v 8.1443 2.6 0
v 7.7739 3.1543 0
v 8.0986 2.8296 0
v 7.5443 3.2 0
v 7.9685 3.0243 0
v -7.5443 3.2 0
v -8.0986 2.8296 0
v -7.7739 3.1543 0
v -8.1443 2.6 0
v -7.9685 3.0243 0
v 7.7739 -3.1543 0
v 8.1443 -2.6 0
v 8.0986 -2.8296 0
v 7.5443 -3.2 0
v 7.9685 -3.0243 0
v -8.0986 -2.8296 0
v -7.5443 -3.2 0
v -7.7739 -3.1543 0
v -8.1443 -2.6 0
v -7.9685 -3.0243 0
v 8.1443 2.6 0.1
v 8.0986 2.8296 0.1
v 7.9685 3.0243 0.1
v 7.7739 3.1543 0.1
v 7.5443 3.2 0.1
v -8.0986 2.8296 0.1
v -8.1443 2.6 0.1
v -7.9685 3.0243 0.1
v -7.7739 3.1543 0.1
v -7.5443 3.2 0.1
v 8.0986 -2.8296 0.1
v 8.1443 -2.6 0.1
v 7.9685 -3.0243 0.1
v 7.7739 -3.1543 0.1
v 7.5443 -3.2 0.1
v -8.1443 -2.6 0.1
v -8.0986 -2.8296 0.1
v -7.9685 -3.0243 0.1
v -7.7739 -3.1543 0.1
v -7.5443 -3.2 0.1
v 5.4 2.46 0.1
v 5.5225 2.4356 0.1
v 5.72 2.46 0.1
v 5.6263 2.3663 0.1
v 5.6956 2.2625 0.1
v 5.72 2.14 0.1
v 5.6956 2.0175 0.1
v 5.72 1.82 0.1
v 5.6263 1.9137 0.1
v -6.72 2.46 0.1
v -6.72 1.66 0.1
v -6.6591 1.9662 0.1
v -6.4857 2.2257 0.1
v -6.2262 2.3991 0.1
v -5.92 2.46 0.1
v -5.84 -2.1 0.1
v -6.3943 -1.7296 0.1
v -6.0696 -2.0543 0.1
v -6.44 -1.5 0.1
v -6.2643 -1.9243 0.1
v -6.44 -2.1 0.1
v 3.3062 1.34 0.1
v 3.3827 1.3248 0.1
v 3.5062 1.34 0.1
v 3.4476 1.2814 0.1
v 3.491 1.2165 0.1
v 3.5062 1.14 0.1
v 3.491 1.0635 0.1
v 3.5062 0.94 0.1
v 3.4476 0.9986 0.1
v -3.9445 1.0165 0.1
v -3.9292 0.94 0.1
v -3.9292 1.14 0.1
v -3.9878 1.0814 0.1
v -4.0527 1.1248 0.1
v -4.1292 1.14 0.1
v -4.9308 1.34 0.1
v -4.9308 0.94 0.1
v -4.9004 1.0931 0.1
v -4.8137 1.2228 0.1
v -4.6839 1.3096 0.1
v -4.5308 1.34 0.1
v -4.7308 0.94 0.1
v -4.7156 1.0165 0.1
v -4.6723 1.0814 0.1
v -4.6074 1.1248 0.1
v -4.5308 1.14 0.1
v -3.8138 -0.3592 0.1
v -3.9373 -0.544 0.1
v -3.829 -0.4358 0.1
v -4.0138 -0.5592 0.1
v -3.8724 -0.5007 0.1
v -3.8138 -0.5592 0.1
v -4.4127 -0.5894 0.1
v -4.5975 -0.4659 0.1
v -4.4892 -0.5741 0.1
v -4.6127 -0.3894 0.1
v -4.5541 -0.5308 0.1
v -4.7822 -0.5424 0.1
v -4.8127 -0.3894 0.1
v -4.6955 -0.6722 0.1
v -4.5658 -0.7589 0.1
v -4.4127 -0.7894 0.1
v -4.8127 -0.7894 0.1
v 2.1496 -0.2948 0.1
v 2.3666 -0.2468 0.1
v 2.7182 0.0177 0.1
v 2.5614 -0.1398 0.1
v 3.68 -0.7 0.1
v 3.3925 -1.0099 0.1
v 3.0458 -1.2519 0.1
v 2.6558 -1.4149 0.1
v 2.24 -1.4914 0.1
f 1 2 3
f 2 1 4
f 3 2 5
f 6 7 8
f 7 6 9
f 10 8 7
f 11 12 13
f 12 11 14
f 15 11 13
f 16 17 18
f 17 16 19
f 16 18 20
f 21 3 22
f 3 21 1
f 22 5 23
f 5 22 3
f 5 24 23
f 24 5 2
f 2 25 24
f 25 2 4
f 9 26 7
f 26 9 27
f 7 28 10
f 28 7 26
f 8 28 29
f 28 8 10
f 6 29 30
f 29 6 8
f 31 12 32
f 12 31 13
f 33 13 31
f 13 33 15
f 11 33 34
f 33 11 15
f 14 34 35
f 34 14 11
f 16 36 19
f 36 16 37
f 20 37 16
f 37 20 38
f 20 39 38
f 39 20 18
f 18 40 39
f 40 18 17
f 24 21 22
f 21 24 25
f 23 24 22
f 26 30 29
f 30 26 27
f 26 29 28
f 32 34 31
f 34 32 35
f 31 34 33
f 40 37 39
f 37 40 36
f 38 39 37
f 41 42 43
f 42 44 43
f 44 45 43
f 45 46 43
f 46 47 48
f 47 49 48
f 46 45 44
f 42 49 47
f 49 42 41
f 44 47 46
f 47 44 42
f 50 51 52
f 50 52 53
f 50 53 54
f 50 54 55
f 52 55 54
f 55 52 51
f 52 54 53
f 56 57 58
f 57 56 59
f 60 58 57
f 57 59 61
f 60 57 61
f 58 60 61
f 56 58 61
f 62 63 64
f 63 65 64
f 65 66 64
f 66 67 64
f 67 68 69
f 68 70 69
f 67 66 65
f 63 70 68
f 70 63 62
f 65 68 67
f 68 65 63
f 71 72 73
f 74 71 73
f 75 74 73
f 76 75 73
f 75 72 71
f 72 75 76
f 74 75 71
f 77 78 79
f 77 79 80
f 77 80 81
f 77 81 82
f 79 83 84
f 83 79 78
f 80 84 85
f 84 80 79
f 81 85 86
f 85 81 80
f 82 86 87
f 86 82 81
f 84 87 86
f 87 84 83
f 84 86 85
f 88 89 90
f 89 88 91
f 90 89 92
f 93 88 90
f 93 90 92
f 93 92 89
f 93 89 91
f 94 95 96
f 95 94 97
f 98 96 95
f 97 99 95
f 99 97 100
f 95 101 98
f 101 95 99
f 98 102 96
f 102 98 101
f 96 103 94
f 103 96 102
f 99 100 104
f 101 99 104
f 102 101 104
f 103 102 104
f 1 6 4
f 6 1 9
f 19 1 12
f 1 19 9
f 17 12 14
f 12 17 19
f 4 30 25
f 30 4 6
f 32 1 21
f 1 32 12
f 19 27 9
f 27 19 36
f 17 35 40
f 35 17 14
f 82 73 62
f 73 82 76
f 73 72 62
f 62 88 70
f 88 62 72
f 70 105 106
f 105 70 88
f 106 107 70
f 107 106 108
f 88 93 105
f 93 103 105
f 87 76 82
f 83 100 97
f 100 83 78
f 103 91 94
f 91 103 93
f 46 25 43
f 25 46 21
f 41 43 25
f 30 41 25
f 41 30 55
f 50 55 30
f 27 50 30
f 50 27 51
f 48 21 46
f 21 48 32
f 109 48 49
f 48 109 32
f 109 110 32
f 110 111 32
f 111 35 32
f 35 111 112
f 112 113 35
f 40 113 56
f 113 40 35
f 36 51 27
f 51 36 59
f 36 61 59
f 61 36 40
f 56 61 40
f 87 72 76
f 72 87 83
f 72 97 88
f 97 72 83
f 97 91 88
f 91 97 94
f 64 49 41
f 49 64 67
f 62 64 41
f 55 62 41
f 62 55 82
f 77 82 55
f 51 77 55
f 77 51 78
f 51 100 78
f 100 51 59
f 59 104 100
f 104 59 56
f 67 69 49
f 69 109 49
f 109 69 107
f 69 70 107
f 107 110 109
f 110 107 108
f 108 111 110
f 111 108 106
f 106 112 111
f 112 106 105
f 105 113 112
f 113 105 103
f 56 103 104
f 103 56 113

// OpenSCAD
// file: ../p/3-8ndis.scad
use <../lib.scad>
function ldraw_lib__3_8ndis() = [
// 0 Disc Negative 0.375
// 0 Name: 3-8ndis.dat
// 0 Author: Alex Taylor [anathema]
// 0 !LDRAW_ORG Primitive UPDATE 2009-02
// 0 !LICENSE Licensed under CC BY 2.0 and CC BY 4.0 : see CAreadme.txt
// 
// 0 BFC CERTIFY CCW
  [0,"BFC","CERTIFY"],
  [0,"BFC","CCW"],
// 
// 0 !HISTORY 2009-09-03 [PTadmin] Official Update 2009-02
// 
// 
// 3 16 1 0 1 0.9239 0 0.3827 1 0 0
  [3,16,1,0,1,0.9239,0,0.3827,1,0,0],
// 3 16 1 0 1 0.7071 0 0.7071 0.9239 0 0.3827
  [3,16,1,0,1,0.7071,0,0.7071,0.9239,0,0.3827],
// 3 16 1 0 1 0.3827 0 0.9239 0.7071 0 0.7071
  [3,16,1,0,1,0.3827,0,0.9239,0.7071,0,0.7071],
// 3 16 1 0 1 0 0 1 0.3827 0 0.9239
  [3,16,1,0,1,0,0,1,0.3827,0,0.9239],
// 3 16 -1 0 1 -0.3827 0 0.9239 0 0 1
  [3,16,-1,0,1,-0.3827,0,0.9239,0,0,1],
// 3 16 -1 0 1 -0.7071 0 0.7071 -0.3827 0 0.9239
  [3,16,-1,0,1,-0.7071,0,0.7071,-0.3827,0,0.9239],
// 0
];
makepoly(ldraw_lib__3_8ndis(), line=0.2);
// file: ../p/3-8chrd.scad
use <../lib.scad>
function ldraw_lib__3_8chrd() = [
// 0 Chord 0.375
// 0 Name: 3-8chrd.dat
// 0 Author: Donald Sutter [technog]
// 0 !LDRAW_ORG Primitive UPDATE 2005-01
// 0 !LICENSE Licensed under CC BY 2.0 and CC BY 4.0 : see CAreadme.txt
// 
// 0 BFC CERTIFY CCW
  [0,"BFC","CERTIFY"],
  [0,"BFC","CCW"],
// 
// 0 !HISTORY 2004-01-07 [Steffen] added primitive code for POVray
// 0 !HISTORY 2004-03-18 [mkennedy] removed pov code and rearanged polygons.
// 0 !HISTORY 2004-09-12 [cwdee] reversed winding and standardised precision
// 0 !HISTORY 2005-12-28 [PTadmin] Official Update 2005-01
// 0 !HISTORY 2007-06-24 [PTadmin] Header formatted for Contributor Agreement
// 0 !HISTORY 2008-07-01 [PTadmin] Official Update 2008-01
// 
// 
// 3 16 0.7071 0 0.7071 0.3827 0 0.9239 0 0 1
  [3,16,0.7071,0,0.7071,0.3827,0,0.9239,0,0,1],
// 4 16 0.9239 0 0.3827 -0.3827 0 0.9239 -0.7071 0 0.7071 1 0 0
  [4,16,0.9239,0,0.3827,-0.3827,0,0.9239,-0.7071,0,0.7071,1,0,0],
// 4 16 0.7071 0 0.7071 0 0 1 -0.3827 0 0.9239 0.9239 0 0.3827
  [4,16,0.7071,0,0.7071,0,0,1,-0.3827,0,0.9239,0.9239,0,0.3827],
// 0
];
makepoly(ldraw_lib__3_8chrd(), line=0.2);
// file: ../p/1-4ring1.scad
use <../lib.scad>
function ldraw_lib__1_4ring1() = [
// 0 Ring  1 x 0.25
// 0 Name: 1-4ring1.dat
// 0 Author: Chris Dee [cwdee]
// 0 !LDRAW_ORG Primitive UPDATE 2012-01
// 0 !LICENSE Licensed under CC BY 2.0 and CC BY 4.0 : see CAreadme.txt
// 
// 0 BFC CERTIFY CCW
  [0,"BFC","CERTIFY"],
  [0,"BFC","CCW"],
// 
// 0 !HISTORY 2000-05-07 [PTadmin] Official Update 2000-01
// 0 !HISTORY 2002-11-22 [hafhead] Added BFC statement
// 0 !HISTORY 2002-11-30 [PTadmin] Official Update 2002-05
// 0 !HISTORY 2007-06-22 [PTadmin] Header formatted for Contributor Agreement
// 0 !HISTORY 2008-07-01 [PTadmin] Official Update 2008-01
// 0 !HISTORY 2012-02-16 [Philo] Changed to CCW
// 0 !HISTORY 2012-03-30 [PTadmin] Official Update 2012-01
// 
// 
// 4 16 2 0 0 1.8478 0 0.7654 0.9239 0 0.3827 1 0 0
  [4,16,2,0,0,1.8478,0,0.7654,0.9239,0,0.3827,1,0,0],
// 4 16 1.8478 0 0.7654 1.4142 0 1.4142 0.7071 0 0.7071 0.9239 0 0.3827
  [4,16,1.8478,0,0.7654,1.4142,0,1.4142,0.7071,0,0.7071,0.9239,0,0.3827],
// 4 16 1.4142 0 1.4142 0.7654 0 1.8478 0.3827 0 0.9239 0.7071 0 0.7071
  [4,16,1.4142,0,1.4142,0.7654,0,1.8478,0.3827,0,0.9239,0.7071,0,0.7071],
// 4 16 0.7654 0 1.8478 0 0 2 0 0 1 0.3827 0 0.9239
  [4,16,0.7654,0,1.8478,0,0,2,0,0,1,0.3827,0,0.9239],
];
makepoly(ldraw_lib__1_4ring1(), line=0.2);
// file: ../p/1-4ndis.scad
use <../lib.scad>
function ldraw_lib__1_4ndis() = [
// 0 Disc Negative 0.25
// 0 Name: 1-4ndis.dat
// 0 Author: James Jessiman
// 0 !LDRAW_ORG Primitive UPDATE 2012-01
// 0 !LICENSE Licensed under CC BY 2.0 and CC BY 4.0 : see CAreadme.txt
// 
// 0 BFC CERTIFY CCW
  [0,"BFC","CERTIFY"],
  [0,"BFC","CCW"],
// 
// 0 !HISTORY 2002-03-23 [sbliss] Added BFC Statement
// 0 !HISTORY 2002-04-25 [PTadmin] Official Update 2002-02
// 0 !HISTORY 2007-06-22 [PTadmin] Header formatted for Contributor Agreement
// 0 !HISTORY 2008-07-01 [PTadmin] Official Update 2008-01
// 0 !HISTORY 2012-02-16 [Philo] Changed to CCW
// 0 !HISTORY 2012-03-30 [PTadmin] Official Update 2012-01
// 
// 
// 3 16 0.9239 0 0.3827 1 0 0 1 0 1
  [3,16,0.9239,0,0.3827,1,0,0,1,0,1],
// 3 16 0.7071 0 0.7071 0.9239 0 0.3827 1 0 1
  [3,16,0.7071,0,0.7071,0.9239,0,0.3827,1,0,1],
// 3 16 0.3827 0 0.9239 0.7071 0 0.7071 1 0 1
  [3,16,0.3827,0,0.9239,0.7071,0,0.7071,1,0,1],
// 3 16 0 0 1 0.3827 0 0.9239 1 0 1
  [3,16,0,0,1,0.3827,0,0.9239,1,0,1],
];
makepoly(ldraw_lib__1_4ndis(), line=0.2);
// file: ../p/1-4cyli.scad
use <../lib.scad>
function ldraw_lib__1_4cyli() = [
// 0 Cylinder 0.25
// 0 Name: 1-4cyli.dat
// 0 Author: James Jessiman
// 0 !LDRAW_ORG Primitive UPDATE 2012-01
// 0 !LICENSE Licensed under CC BY 2.0 and CC BY 4.0 : see CAreadme.txt
// 
// 0 BFC CERTIFY CCW
  [0,"BFC","CERTIFY"],
  [0,"BFC","CCW"],
// 
// 0 !HISTORY 2002-03-23 [sbliss] Added BFC statement.
// 0 !HISTORY 2002-04-25 [PTadmin] Official Update 2002-02
// 0 !HISTORY 2007-06-22 [PTadmin] Header formatted for Contributor Agreement
// 0 !HISTORY 2008-07-01 [PTadmin] Official Update 2008-01
// 0 !HISTORY 2012-02-16 [Philo] Changed to CCW
// 0 !HISTORY 2012-03-30 [PTadmin] Official Update 2012-01
// 
// 
// 4 16 1 1 0 0.9239 1 0.3827 0.9239 0 0.3827 1 0 0
  [4,16,1,1,0,0.9239,1,0.3827,0.9239,0,0.3827,1,0,0],
// 5 24 1 0 0 1 1 0 0.9239 0 0.3827 1 0 -1
  [5,24,1,0,0,1,1,0,0.9239,0,0.3827,1,0,-1],
// 4 16 0.9239 1 0.3827 0.7071 1 0.7071 0.7071 0 0.7071 0.9239 0 0.3827
  [4,16,0.9239,1,0.3827,0.7071,1,0.7071,0.7071,0,0.7071,0.9239,0,0.3827],
// 5 24 0.9239 0 0.3827 0.9239 1 0.3827 0.7071 0 0.7071 1 0 0
  [5,24,0.9239,0,0.3827,0.9239,1,0.3827,0.7071,0,0.7071,1,0,0],
// 4 16 0.7071 1 0.7071 0.3827 1 0.9239 0.3827 0 0.9239 0.7071 0 0.7071
  [4,16,0.7071,1,0.7071,0.3827,1,0.9239,0.3827,0,0.9239,0.7071,0,0.7071],
// 5 24 0.7071 0 0.7071 0.7071 1 0.7071 0.3827 0 0.9239 0.9239 0 0.3827
  [5,24,0.7071,0,0.7071,0.7071,1,0.7071,0.3827,0,0.9239,0.9239,0,0.3827],
// 4 16 0.3827 1 0.9239 0 1 1 0 0 1 0.3827 0 0.9239
  [4,16,0.3827,1,0.9239,0,1,1,0,0,1,0.3827,0,0.9239],
// 5 24 0.3827 0 0.9239 0.3827 1 0.9239 0 0 1 0.7071 0 0.7071
  [5,24,0.3827,0,0.9239,0.3827,1,0.9239,0,0,1,0.7071,0,0.7071],
// 5 24 0 0 1 0 1 1 0.3827 0 0.9239 -1 0 1
  [5,24,0,0,1,0,1,1,0.3827,0,0.9239,-1,0,1],
];
makepoly(ldraw_lib__1_4cyli(), line=0.2);
// file: ../p/1-4chrd.scad
use <../lib.scad>
function ldraw_lib__1_4chrd() = [
// 0 Chord 0.25
// 0 Name: 1-4chrd.dat
// 0 Author: Tony Hafner [hafhead]
// 0 !LDRAW_ORG Primitive UPDATE 2012-02
// 0 !LICENSE Licensed under CC BY 2.0 and CC BY 4.0 : see CAreadme.txt
// 
// 0 BFC CERTIFY CCW
  [0,"BFC","CERTIFY"],
  [0,"BFC","CCW"],
// 
// 0 !HISTORY 2004-04-22 [PTadmin] Official Update 2004-02
// 0 !HISTORY 2007-10-09 [PTadmin] Header formatted for Contributor Agreement
// 0 !HISTORY 2008-07-01 [PTadmin] Official Update 2008-01
// 0 !HISTORY 2012-08-02 [MMR1988] Re-creation with PrimGen2 and Rectifier
// 0 !HISTORY 2012-08-09 [PTadmin] Official Update 2012-02
// 
// 
// 4 16 0.9239 0 0.3827 0.3827 0 0.9239 0 0 1 1 0 0
  [4,16,0.9239,0,0.3827,0.3827,0,0.9239,0,0,1,1,0,0],
// 3 16 0.7071 0 0.7071 0.3827 0 0.9239 0.9239 0 0.3827
  [3,16,0.7071,0,0.7071,0.3827,0,0.9239,0.9239,0,0.3827],
];
makepoly(ldraw_lib__1_4chrd(), line=0.2);
// main file
use <../lib.scad>
use <6141875h.scad>
function ldraw_lib__6141875i() = [
// 0 Sticker  0.8 x  2.0 with Dark Bluish Grey Air Vent on Black Background Left
// 0 Name: 6141875i.dat
// 0 Author: Massimo Maso [Sirio]
// 0 !LDRAW_ORG Part UPDATE 2022-06
// 0 !LICENSE Licensed under CC BY 2.0 and CC BY 4.0 : see CAreadme.txt
// 
// 0 BFC CERTIFY CCW
  [0,"BFC","CERTIFY"],
  [0,"BFC","CCW"],
// 
// 0 !KEYWORDS Bricklink 75875stk01, Brickowl 53567, F-150, Ford, Raptor
// 0 !KEYWORDS Rebrickable 24760, Set 75875, Speed Champions
// 
// 0 !HISTORY 2022-12-20 [PTadmin] Official Update 2022-06
// 
// 
// 1 16 0 0 0 -1 0 0 0 1 0 0 0 1 6141875h.dat
  [1,16,0,0,0,-1,0,0,0,1,0,0,0,1, ldraw_lib__6141875h()],
];
makepoly(ldraw_lib__6141875i(), line=0.2);
